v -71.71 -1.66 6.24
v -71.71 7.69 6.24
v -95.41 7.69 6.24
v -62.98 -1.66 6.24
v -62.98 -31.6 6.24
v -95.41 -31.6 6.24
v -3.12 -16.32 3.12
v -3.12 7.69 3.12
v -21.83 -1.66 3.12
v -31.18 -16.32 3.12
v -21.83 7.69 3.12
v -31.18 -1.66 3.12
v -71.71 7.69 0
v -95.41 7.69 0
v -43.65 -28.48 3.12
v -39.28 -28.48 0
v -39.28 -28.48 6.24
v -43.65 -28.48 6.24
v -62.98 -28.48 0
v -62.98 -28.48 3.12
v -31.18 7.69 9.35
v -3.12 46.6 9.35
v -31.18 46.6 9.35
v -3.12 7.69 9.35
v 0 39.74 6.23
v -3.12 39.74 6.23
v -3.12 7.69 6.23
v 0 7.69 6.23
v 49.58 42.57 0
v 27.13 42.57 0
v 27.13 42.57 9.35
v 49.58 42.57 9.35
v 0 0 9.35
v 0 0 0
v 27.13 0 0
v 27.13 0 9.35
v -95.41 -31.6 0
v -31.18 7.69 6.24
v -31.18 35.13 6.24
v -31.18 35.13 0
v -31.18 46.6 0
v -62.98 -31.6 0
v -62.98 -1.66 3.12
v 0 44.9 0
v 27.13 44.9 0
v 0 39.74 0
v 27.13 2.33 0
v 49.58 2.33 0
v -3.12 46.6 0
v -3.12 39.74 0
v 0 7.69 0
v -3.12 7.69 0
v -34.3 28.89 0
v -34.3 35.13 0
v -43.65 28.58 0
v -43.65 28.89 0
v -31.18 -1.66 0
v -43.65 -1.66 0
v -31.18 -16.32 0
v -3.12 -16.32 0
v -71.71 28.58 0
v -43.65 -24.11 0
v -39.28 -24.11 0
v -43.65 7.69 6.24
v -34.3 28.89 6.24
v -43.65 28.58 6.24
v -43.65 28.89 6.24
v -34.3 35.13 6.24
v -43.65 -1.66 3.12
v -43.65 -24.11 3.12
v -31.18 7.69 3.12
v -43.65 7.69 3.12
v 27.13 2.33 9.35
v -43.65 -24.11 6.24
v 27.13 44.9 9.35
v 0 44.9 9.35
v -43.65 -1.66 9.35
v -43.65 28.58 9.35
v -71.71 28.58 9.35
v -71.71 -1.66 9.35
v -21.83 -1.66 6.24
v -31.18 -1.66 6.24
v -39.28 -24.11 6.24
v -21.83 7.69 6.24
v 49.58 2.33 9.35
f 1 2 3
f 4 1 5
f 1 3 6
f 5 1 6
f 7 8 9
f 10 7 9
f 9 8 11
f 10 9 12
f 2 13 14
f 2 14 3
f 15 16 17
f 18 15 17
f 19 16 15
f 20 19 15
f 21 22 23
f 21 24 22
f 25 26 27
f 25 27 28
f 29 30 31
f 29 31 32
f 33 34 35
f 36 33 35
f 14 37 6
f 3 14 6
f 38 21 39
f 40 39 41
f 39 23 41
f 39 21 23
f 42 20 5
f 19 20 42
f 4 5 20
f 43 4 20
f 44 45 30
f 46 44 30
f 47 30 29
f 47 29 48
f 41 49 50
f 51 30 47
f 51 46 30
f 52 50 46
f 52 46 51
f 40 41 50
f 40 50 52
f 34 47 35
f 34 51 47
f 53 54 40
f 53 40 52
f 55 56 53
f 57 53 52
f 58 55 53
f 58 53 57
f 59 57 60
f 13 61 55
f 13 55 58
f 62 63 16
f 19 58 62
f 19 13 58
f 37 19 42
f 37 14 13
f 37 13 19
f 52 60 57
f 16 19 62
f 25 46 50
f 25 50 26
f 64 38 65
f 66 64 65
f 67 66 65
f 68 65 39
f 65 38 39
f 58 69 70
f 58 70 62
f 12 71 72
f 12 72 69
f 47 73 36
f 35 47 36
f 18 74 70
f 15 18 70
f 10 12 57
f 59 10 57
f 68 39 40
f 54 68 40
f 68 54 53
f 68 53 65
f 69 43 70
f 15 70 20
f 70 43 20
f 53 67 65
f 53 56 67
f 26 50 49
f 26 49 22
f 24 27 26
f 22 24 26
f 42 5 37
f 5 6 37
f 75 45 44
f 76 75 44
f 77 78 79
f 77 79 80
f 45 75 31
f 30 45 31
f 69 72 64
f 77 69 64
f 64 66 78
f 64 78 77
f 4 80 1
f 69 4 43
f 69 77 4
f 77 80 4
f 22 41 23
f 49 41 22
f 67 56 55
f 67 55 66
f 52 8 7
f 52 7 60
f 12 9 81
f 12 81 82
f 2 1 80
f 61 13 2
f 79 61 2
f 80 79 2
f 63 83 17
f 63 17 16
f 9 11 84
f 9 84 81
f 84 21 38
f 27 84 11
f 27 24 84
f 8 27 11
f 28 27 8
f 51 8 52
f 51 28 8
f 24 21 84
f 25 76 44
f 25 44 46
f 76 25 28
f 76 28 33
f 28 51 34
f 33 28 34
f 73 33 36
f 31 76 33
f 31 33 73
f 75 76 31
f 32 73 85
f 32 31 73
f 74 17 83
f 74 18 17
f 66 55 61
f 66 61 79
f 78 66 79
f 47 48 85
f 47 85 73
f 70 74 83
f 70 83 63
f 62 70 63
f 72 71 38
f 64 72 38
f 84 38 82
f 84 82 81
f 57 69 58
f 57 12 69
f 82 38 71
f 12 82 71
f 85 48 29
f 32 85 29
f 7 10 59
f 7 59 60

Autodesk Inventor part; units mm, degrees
ref_plane "YZ Plane" through (0, 0, 0) normal (1, 0, 0) x (0, 1, 0)
ref_plane "XZ Plane" through (0, 0, 0) normal (0, 1, 0) x (-1, 0, 0)
ref_plane "XY Plane" through (0, 0, 0) normal (0, 0, 1) x (1, 0, 0)
sketch "Sketch1" plane through (0, 0, 0) normal (0, 0, 1) x (1, 0, 0)
  line L0 (0, 0) -> (49.58, 0)
  line L1 (49.58, 0) -> (49.58, 44.9)
  line L2 (49.58, 44.9) -> (0, 44.9)
  line L3 (0, 44.9) -> (0, 0)
  line L4 (49.58, 2.33) -> (27.13, 2.33)
  line L5 (27.13, 2.33) -> (27.13, 0)
  line L6 (27.13, 44.9) -> (27.13, 42.57)
  line L7 (27.13, 42.57) -> (49.58, 42.57)
  dimension "d0" = 49.58
  dimension "d1" = 44.9
  dimension "d2" = 22.45
  dimension "d3" = 2.33
extrude "Extrusion1" add sketch "Sketch1" along normal blind 9.35 contours L3 L2 L6 L7 L1 L4 L5 L0
sketch "Sketch2" plane through (0, 0, 0) normal (-1, 0, 0) x (0, 0, 1)
  line L0 (0, 44.9) -> (0, 0) projected
  line L1 (9.35, 44.9) -> (9.35, 0) projected
  line L2 (0, 44.9) -> (9.35, 44.9) projected
  line L3 (0, 39.74) -> (9.35, 39.74)
  line L4 (9.35, 39.74) -> (9.35, 7.69)
  line L5 (9.35, 7.69) -> (0, 7.69)
  line L6 (0, 7.69) -> (0, 39.74)
  dimension "d6" = 32.05
  dimension "d7" = 5.16
extrude "Extrusion2" add sketch "Sketch2" along normal blind 31.18 contours L3 L1 L5 L0
sketch "Sketch3" plane through (0, 0, 9.35) normal (0, 0, 1) x (1, 0, 0)
  line L0 (0, 39.74) -> (-31.18, 39.74) projected
  line L1 (-3.12, 39.74) -> (0, 39.74)
  line L2 (0, 39.74) -> (0, 7.69)
  line L3 (0, 7.69) -> (-3.12, 7.69)
  line L4 (-3.12, 7.69) -> (-3.12, 39.74)
extrude "Extrusion3" cut sketch "Sketch3" against normal blind 3.12
sketch "Sketch4" plane through (-31.18, 39.74, 0) normal (0, 1, 0) x (1, 0, 0)
  line L0 (0, -9.35) -> (0, 0) projected
  line L1 (28.06, -9.35) -> (0, -9.35) projected
  line L2 (31.18, 0) -> (0, 0) projected
  line L3 (28.06, -9.35) -> (0, -9.35)
  line L4 (0, -9.35) -> (0, 0)
  line L5 (0, 0) -> (28.06, 0)
  line L6 (28.06, 0) -> (28.06, -9.35)
extrude "Extrusion4" add sketch "Sketch4" along normal blind 6.86
sketch "Sketch5" plane through (-31.18, 7.69, 0) normal (0, -1, 0) x (1, 0, 0)
  line L0 (28.06, 0) -> (0, 0) projected
  line L1 (28.06, 9.35) -> (28.06, 0) projected
  line L2 (0, 0) -> (28.06, 0)
  line L3 (28.06, 0) -> (28.06, 3.12)
  line L4 (28.06, 3.12) -> (0, 3.12)
  line L5 (0, 3.12) -> (0, 0)
  dimension "d14" = 3.12
extrude "Extrusion5" add sketch "Sketch5" along normal blind 24.01
sketch "Sketch6" plane through (-31.18, 7.69, 3.12) normal (0, 0, 1) x (1, 0, 0)
  line L0 (0, 0) -> (9.35, 0)
  line L1 (9.35, 0) -> (9.35, -9.35)
  line L2 (9.35, -9.35) -> (0, -9.35)
  line L3 (0, -9.35) -> (0, 0)
  point P0 (31.18, -7.69)
  dimension "d17" = 9.35
  dimension "d18" = 9.35
extrude "Extrusion6" add sketch "Sketch6" along normal blind 3.12
sketch "Sketch7" plane through (-31.18, 0, 0) normal (-1, 0, 0) x (0, 0, 1)
  line L0 (3.12, 7.69) -> (0, 7.69) projected
  line L1 (3.12, -1.66) -> (0, -1.66)
  line L2 (0, -1.66) -> (0, 7.69)
  line L3 (0, 7.69) -> (3.12, 7.69)
  line L4 (3.12, 7.69) -> (3.12, -1.66)
  line L5 (0, 7.69) -> (6.24, 7.69)
  line L6 (6.24, 7.69) -> (6.24, 35.13)
  line L7 (6.24, 35.13) -> (0, 35.13)
  line L8 (0, 35.13) -> (0, 7.69)
  line L9 (0, -16.32) -> (0, 46.6) projected
  point P0 (0, 0)
  dimension "d21" = 27.44
  dimension "d24" = 6.24
extrude "Extrusion7" add sketch "Sketch7" along normal blind 12.47
sketch "Sketch8" plane through (-31.18, 35.13, 6.24) normal (0, 1, 0) x (1, 0, 0)
  line L0 (-12.47, 0) -> (-12.47, 6.24) projected
  line L1 (0, 6.24) -> (-12.47, 6.24) projected
  line L2 (0, 0) -> (-12.47, 0) projected
  line L3 (0, 6.24) -> (-3.12, 6.24)
  line L4 (-3.12, 6.24) -> (-3.12, 0)
  line L5 (-3.12, 0) -> (0, 0)
  line L6 (0, 0) -> (0, 6.24)
  point P0 (31.18, 6.24)
  dimension "d25" = 3.12
extrude "Extrusion8" cut sketch "Sketch8" against normal blind 6.24 contours L0 L1 L4 L2
sketch "Sketch9" plane through (-43.65, 0, 0) normal (-1, 0, 0) x (0, 0, 1)
  line L0 (0, 28.89) -> (0, -1.66) projected
  line L1 (0, 28.58) -> (9.35, 28.58)
  line L2 (9.35, 28.58) -> (9.35, -1.66)
  line L3 (9.35, -1.66) -> (0, -1.66)
  line L4 (0, -1.66) -> (0, 28.58)
  point P0 (0, 0)
extrude "Extrusion9" add sketch "Sketch9" along normal blind 28.06
sketch "Sketch10" plane through (-71.71, 0, 0) normal (-1, 0, 0) x (0, 0, 1)
  line L0 (0, 28.58) -> (0, -1.66) projected
  line L1 (0, 7.69) -> (6.24, 7.69)
  line L2 (6.24, 7.69) -> (6.24, -31.6)
  line L3 (6.24, -31.6) -> (0, -31.6)
  line L4 (0, -31.6) -> (0, 7.69)
  point P0 (0, 0)
  dimension "d30" = 39.29
extrude "Extrusion10" add sketch "Sketch10" along normal blind 23.7
sketch "Sketch11" plane through (-71.71, 0, 0) normal (1, 0, 0) x (0, 0, -1)
  line L0 (0, -1.66) -> (-6.24, -1.66) projected
  line L1 (-6.24, -1.66) -> (-6.24, -31.6) projected
  line L2 (-6.24, -31.6) -> (0, -31.6) projected
  line L3 (0, -31.6) -> (0, -1.66) projected
  point P0 (0, 0)
extrude "Extrusion11" add sketch "Sketch11" along normal blind 8.73
sketch "Sketch12" plane through (-62.98, 0, 0) normal (1, 0, 0) x (0, 0, -1)
  line L0 (0, -1.66) -> (-3.12, -1.66)
  line L1 (-3.12, -1.66) -> (-3.12, -28.48)
  line L2 (-3.12, -28.48) -> (0, -28.48)
  line L3 (0, -28.48) -> (0, -1.66)
  point P0 (0, 0)
  dimension "d35" = 26.82
extrude "Extrusion12" add sketch "Sketch12" along normal blind 19.33
sketch "Sketch13" plane through (-43.65, 0, 0) normal (1, 0, 0) x (0, 0, -1)
  line L0 (0, -28.48) -> (-6.24, -28.48)
  line L1 (-6.24, -28.48) -> (-6.24, -24.11)
  line L2 (-6.24, -24.11) -> (0, -24.11)
  line L3 (0, -24.11) -> (0, -28.48)
  point P0 (0, 0)
  dimension "d38" = 6.24
  dimension "d39" = 4.37
extrude "Extrusion13" add sketch "Sketch13" along normal blind 4.37
properties part number "Sportcenter" material "UHMW, White"
